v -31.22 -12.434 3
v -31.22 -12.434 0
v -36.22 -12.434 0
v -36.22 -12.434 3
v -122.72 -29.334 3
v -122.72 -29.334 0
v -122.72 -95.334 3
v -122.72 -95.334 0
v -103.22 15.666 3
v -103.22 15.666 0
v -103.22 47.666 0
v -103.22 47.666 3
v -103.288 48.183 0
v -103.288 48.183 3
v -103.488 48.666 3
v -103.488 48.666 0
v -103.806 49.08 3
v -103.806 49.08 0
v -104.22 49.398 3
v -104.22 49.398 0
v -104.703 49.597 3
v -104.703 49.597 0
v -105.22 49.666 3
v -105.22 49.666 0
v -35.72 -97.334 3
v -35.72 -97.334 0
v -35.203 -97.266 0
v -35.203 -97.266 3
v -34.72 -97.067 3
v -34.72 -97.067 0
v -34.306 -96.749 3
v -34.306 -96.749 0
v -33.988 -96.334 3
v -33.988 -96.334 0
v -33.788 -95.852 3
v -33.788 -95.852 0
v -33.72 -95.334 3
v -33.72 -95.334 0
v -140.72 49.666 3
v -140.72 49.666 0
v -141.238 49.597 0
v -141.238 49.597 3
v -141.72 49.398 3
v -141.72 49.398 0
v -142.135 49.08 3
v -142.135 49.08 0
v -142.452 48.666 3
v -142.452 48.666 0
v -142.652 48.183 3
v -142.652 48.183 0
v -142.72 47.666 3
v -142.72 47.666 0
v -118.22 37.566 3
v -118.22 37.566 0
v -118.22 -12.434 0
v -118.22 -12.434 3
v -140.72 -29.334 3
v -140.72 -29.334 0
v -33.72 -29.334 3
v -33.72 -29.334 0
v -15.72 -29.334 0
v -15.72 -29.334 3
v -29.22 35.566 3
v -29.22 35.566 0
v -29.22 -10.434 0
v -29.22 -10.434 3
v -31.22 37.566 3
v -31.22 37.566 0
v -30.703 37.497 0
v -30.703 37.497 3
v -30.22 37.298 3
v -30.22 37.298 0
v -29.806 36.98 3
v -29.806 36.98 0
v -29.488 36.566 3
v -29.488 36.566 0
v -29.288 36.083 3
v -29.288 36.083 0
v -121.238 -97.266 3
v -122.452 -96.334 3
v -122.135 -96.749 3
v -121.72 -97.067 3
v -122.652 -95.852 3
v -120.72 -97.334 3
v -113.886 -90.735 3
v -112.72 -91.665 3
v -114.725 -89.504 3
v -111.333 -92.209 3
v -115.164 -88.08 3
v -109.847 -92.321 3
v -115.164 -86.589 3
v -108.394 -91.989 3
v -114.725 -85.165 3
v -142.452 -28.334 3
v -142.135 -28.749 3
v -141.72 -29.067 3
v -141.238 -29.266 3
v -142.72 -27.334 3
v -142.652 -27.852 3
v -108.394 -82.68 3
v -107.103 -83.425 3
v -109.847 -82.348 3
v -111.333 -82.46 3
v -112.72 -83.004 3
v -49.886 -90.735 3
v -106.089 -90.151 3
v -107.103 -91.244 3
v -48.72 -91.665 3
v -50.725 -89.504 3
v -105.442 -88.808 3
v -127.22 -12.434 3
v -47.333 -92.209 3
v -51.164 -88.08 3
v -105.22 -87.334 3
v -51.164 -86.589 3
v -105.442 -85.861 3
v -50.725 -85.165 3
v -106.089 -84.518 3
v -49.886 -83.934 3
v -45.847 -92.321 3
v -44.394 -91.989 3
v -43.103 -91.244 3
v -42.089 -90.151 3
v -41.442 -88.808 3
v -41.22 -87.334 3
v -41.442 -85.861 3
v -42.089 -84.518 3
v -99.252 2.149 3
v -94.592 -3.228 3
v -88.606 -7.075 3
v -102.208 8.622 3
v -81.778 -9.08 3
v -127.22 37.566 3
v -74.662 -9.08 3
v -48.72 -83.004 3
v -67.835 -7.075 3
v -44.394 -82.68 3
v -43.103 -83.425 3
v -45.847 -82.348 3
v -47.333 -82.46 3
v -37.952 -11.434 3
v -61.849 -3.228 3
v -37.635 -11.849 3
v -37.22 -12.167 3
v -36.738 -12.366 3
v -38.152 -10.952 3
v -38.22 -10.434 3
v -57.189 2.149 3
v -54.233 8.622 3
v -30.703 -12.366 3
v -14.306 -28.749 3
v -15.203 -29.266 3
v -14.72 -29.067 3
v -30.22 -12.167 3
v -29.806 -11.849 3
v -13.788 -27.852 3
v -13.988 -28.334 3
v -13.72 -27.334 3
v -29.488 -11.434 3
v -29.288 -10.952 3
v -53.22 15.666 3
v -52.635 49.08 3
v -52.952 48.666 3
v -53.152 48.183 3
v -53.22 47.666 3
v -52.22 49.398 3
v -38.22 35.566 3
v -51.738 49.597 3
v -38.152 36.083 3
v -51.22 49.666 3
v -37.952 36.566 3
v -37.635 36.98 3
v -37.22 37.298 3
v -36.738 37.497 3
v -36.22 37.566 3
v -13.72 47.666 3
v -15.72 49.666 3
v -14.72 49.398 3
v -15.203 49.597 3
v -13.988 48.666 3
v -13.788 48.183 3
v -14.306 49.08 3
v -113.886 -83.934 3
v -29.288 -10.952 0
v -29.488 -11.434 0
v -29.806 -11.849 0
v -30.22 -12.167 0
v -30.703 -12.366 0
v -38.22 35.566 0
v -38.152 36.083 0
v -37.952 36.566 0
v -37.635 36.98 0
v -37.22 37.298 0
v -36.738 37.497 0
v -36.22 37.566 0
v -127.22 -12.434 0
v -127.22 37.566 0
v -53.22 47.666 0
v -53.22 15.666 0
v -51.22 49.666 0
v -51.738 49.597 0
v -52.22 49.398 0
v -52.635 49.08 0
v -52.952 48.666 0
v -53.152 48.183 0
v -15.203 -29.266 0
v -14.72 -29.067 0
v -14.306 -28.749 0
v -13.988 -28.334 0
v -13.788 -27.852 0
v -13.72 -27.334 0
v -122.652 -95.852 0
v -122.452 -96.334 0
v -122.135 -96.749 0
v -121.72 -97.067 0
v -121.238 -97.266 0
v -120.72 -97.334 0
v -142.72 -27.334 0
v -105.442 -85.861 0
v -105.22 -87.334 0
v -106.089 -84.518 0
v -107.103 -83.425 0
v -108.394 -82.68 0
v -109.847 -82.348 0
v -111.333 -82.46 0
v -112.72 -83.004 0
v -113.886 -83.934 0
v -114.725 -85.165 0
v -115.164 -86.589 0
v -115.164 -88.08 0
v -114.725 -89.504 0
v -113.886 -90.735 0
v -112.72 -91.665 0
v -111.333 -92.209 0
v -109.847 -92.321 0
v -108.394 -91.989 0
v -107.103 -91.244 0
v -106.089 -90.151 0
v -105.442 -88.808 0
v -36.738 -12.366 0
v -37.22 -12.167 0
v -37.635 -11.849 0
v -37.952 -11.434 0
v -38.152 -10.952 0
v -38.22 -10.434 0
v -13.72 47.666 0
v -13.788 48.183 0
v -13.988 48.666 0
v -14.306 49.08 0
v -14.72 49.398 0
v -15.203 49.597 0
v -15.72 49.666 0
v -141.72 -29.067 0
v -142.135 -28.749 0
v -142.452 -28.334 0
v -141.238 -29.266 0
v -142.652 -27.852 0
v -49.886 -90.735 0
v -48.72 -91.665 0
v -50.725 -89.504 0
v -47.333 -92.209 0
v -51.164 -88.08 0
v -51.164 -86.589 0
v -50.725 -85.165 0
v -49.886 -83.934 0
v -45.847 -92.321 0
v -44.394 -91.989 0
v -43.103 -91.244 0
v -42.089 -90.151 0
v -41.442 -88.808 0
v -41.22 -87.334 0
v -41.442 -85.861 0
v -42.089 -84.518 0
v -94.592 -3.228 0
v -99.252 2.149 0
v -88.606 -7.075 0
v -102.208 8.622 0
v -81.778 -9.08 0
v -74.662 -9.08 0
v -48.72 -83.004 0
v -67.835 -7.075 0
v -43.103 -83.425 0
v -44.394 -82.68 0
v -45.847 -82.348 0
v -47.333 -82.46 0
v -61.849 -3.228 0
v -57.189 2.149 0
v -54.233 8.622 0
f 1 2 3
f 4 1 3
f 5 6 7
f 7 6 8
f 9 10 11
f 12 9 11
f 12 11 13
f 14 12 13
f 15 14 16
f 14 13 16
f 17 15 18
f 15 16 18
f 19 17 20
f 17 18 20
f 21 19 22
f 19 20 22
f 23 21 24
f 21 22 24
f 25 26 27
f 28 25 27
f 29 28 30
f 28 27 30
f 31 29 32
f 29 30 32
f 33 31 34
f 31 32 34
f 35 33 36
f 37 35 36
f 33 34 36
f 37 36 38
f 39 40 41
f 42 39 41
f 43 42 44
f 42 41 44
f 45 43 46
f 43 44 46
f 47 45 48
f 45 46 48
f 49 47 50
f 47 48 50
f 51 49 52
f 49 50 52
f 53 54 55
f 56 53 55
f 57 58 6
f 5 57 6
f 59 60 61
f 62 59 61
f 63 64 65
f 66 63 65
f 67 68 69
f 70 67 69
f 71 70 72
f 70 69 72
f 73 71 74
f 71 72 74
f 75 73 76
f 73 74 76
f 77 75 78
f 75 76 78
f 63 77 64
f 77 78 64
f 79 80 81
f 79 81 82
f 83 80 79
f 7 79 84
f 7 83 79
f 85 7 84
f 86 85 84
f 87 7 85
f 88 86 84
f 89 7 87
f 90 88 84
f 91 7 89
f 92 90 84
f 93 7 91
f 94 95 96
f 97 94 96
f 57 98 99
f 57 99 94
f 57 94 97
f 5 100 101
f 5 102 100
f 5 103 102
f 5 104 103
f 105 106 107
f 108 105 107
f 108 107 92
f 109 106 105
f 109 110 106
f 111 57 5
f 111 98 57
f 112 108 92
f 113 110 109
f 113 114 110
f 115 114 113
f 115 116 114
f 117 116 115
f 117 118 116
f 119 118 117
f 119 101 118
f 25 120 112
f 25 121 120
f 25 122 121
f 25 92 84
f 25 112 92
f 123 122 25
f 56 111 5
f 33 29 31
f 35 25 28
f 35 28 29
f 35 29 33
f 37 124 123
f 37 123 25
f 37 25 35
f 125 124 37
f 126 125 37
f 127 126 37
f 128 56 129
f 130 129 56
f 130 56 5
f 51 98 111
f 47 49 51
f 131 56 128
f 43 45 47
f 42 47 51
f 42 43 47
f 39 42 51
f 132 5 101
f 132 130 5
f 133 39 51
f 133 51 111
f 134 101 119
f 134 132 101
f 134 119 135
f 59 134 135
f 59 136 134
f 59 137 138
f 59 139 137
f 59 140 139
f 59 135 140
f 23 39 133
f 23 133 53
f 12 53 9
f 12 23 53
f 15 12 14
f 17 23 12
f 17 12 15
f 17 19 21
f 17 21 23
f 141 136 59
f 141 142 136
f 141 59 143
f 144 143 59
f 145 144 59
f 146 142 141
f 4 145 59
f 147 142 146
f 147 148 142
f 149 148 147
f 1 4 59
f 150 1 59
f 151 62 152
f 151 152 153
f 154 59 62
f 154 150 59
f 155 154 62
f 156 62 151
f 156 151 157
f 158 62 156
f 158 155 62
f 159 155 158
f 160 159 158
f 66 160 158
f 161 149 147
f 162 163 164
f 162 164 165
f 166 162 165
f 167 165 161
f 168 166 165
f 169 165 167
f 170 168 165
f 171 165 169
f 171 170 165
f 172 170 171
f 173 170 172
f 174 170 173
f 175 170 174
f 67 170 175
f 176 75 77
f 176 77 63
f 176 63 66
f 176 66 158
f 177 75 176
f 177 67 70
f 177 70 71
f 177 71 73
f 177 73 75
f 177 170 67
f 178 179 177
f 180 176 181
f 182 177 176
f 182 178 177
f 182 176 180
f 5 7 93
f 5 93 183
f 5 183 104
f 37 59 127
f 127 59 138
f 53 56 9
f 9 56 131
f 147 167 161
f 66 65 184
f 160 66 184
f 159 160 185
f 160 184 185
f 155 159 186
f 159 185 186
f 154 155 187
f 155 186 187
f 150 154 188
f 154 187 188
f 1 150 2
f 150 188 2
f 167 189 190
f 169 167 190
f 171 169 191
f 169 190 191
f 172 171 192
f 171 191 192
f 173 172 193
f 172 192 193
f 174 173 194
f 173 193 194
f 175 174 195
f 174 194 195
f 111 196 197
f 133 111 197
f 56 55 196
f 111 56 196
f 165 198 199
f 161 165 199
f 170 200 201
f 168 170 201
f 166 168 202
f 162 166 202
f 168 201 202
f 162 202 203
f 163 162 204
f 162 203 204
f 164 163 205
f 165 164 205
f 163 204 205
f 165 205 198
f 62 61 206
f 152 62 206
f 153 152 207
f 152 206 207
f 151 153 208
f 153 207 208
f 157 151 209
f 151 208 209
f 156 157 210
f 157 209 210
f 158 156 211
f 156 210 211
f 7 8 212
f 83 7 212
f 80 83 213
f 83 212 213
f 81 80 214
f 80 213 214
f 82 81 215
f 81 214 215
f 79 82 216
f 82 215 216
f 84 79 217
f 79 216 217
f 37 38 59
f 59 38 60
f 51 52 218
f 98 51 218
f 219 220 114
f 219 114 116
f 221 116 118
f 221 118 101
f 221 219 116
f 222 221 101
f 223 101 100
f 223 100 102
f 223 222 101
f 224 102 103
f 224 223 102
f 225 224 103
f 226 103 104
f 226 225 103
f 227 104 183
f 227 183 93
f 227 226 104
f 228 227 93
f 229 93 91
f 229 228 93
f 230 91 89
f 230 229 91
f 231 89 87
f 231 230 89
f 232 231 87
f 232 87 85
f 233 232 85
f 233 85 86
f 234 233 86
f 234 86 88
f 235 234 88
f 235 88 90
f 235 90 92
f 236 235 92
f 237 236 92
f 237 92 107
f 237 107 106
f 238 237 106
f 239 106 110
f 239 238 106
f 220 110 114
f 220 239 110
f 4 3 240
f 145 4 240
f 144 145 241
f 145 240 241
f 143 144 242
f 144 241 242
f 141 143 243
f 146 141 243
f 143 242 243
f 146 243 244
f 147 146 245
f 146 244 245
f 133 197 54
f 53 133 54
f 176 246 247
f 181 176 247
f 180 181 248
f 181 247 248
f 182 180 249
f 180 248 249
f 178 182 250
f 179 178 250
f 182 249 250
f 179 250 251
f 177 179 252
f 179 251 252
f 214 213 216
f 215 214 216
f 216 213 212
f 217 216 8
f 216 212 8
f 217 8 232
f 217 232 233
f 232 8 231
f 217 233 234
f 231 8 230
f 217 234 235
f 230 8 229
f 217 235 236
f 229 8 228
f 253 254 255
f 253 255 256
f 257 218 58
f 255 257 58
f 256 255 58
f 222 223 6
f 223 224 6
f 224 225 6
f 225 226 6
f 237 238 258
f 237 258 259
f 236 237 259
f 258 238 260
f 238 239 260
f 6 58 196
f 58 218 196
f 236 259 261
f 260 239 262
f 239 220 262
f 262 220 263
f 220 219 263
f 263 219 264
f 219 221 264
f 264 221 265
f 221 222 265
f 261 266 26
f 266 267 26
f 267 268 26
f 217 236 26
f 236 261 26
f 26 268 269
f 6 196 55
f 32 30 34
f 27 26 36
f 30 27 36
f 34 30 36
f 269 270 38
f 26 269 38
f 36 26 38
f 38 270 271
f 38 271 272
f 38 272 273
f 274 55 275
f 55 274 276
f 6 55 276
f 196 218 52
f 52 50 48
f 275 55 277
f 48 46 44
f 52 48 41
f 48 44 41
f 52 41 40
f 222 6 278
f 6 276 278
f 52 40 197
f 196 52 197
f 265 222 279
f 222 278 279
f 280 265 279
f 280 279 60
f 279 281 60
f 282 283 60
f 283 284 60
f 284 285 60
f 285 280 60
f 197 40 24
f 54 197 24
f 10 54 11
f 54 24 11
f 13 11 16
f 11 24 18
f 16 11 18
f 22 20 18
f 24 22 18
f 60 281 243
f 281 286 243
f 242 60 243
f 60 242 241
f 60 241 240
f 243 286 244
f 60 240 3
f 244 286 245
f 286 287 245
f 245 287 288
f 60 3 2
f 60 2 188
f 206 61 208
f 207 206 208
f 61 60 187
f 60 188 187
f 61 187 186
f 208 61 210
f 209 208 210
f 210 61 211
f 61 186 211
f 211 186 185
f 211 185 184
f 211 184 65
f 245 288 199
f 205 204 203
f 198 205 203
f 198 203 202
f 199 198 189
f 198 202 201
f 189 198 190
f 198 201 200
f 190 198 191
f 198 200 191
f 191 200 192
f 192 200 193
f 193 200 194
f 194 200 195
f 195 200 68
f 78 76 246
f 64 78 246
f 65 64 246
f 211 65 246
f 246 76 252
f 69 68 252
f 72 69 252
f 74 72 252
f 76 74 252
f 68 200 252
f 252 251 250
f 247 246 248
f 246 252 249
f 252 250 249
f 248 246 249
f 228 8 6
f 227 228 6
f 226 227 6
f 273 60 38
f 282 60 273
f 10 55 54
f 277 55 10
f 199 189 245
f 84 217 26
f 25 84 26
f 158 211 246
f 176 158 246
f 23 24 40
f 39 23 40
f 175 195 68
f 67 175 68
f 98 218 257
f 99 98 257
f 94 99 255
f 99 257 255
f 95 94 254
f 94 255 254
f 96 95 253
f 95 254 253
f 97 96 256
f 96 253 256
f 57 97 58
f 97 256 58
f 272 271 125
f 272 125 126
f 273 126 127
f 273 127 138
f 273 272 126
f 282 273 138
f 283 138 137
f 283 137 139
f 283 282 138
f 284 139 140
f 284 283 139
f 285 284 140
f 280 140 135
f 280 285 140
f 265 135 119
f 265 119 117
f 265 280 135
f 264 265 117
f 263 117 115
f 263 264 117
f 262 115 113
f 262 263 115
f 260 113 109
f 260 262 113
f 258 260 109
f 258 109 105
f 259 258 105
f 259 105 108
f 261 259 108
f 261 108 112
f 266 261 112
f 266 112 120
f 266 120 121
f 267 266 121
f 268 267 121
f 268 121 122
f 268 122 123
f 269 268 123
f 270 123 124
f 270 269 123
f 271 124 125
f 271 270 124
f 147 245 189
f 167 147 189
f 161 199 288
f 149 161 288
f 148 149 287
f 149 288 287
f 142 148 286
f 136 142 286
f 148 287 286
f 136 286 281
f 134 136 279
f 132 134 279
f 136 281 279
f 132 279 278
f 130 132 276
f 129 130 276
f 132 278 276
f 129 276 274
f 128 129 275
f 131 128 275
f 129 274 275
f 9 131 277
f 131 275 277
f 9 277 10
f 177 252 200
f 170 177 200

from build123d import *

# Parameters (mm, degrees)
F0_R     = 5
F1_DEPTH = 3


with BuildPart() as f1:
    # F0 (on Top) → F1 (new body)
    with BuildSketch(Plane.XY):
        with BuildLine():
            Line((-105.220296, 49.665504), (-140.720296, 49.665504))
            ThreePointArc((-140.720296, 49.665504), (-142.13451, 49.079717), (-142.720296, 47.665504))
            Line((-142.720296, 47.665504), (-142.720296, -27.334496))
            ThreePointArc((-142.720296, -27.334496), (-142.13451, -28.74871), (-140.720296, -29.334496))
            Line((-140.720296, -29.334496), (-122.720296, -29.334496))
            Line((-122.720296, -29.334496), (-122.720296, -95.334496))
            ThreePointArc((-122.720296, -95.334496), (-122.13451, -96.74871), (-120.720296, -97.334496))
            Line((-120.720296, -97.334496), (-35.720296, -97.334496))
            ThreePointArc((-35.720296, -97.334496), (-34.306083, -96.74871), (-33.720296, -95.334496))
            Line((-33.720296, -95.334496), (-33.720296, -29.334496))
            Line((-33.720296, -29.334496), (-15.720296, -29.334496))
            ThreePointArc((-15.720296, -29.334496), (-14.306083, -28.74871), (-13.720296, -27.334496))
            Line((-13.720296, -27.334496), (-13.720296, 47.665504))
            ThreePointArc((-13.720296, 47.665504), (-14.306083, 49.079717), (-15.720296, 49.665504))
            Line((-15.720296, 49.665504), (-51.220296, 49.665504))
            ThreePointArc((-51.220296, 49.665504), (-52.63451, 49.079717), (-53.220296, 47.665504))
            Line((-53.220296, 47.665504), (-53.220296, 15.665504))
            ThreePointArc((-53.220296, 15.665504), (-78.220296, -9.334496), (-103.220296, 15.665504))
            Line((-103.220296, 15.665504), (-103.220296, 47.665504))
            ThreePointArc((-103.220296, 47.665504), (-103.806083, 49.079717), (-105.220296, 49.665504))
        make_face()
        with Locations((-110.220296, -87.334496)):
            Circle(F0_R, mode=Mode.SUBTRACT)
        with Locations((-46.220296, -87.334496)):
            Circle(F0_R, mode=Mode.SUBTRACT)
        Polygon((-120.220296, 37.565504), (-118.220296, 37.565504), (-118.220296, 35.565504), (-118.220296, -10.434496), (-118.220296, -12.434496), (-120.220296, -12.434496), (-125.220296, -12.434496), (-127.220296, -12.434496), (-127.220296, -10.434496), (-127.220296, 35.565504), (-127.220296, 37.565504), (-125.220296, 37.565504), align=None, mode=Mode.SUBTRACT)
        with BuildLine():
            ThreePointArc((-38.220296, 35.565504), (-37.63451, 36.979717), (-36.220296, 37.565504))
            Line((-36.220296, 37.565504), (-31.220296, 37.565504))
            ThreePointArc((-31.220296, 37.565504), (-29.806083, 36.979717), (-29.220296, 35.565504))
            Line((-29.220296, 35.565504), (-29.220296, -10.434496))
            ThreePointArc((-29.220296, -10.434496), (-29.806083, -11.84871), (-31.220296, -12.434496))
            Line((-31.220296, -12.434496), (-36.220296, -12.434496))
            ThreePointArc((-36.220296, -12.434496), (-37.63451, -11.84871), (-38.220296, -10.434496))
            Line((-38.220296, -10.434496), (-38.220296, 35.565504))
        make_face(mode=Mode.SUBTRACT)
    extrude(amount=F1_DEPTH)


solid = f1.part
